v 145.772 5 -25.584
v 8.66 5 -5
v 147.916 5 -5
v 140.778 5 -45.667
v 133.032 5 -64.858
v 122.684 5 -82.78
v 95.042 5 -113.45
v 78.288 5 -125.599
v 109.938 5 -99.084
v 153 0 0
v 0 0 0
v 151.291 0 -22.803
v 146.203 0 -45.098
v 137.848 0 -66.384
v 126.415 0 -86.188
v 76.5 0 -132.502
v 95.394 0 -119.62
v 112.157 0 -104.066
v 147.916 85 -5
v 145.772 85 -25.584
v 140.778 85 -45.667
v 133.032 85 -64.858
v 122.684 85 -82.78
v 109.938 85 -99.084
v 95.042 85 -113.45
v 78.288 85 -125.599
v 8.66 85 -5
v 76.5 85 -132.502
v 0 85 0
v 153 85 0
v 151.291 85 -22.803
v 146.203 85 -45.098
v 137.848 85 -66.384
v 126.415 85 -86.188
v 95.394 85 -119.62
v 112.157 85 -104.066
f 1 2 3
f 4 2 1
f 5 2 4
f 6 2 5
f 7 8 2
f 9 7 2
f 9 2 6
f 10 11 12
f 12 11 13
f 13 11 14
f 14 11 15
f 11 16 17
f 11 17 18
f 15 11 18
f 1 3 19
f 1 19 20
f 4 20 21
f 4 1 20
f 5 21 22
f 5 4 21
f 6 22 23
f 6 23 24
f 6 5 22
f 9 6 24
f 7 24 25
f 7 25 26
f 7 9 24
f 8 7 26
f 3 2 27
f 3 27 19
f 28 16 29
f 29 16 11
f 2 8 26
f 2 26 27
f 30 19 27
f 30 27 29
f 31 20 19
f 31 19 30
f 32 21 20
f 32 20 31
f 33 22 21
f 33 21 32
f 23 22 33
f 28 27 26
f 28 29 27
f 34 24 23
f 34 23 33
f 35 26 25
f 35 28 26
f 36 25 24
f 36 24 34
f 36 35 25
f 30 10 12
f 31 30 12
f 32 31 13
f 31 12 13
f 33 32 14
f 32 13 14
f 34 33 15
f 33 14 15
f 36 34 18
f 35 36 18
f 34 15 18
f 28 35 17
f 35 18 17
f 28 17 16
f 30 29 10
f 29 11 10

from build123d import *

# Parameters (mm, degrees)
EXTRUDE_1_DEPTH   = 5
EXTRUDE_1_2_DEPTH = 80


with BuildPart() as part:
    # 草图1 → Extrude 1 (new body)
    with BuildSketch(Plane(origin=(0, 0, 0), x_dir=(1, 0, 0), z_dir=(0, 1, 0))):
        with BuildLine():
            Line((0, 0), (153, 0))
            ThreePointArc((153, 0), (132.501886779, 76.5), (76.5, 132.501886779))
            Line((76.5, 132.501886779), (0, 0))
        make_face()
    extrude(amount=EXTRUDE_1_DEPTH)

    # 草图2 → Extrude 1 2 (add)
    with BuildSketch(Plane(origin=(0, 5, 0), x_dir=(1, 0, 0), z_dir=(0, 1, 0))):
        with BuildLine():
            Line((76.5, 132.501886779), (0, 0))
            Line((0, 0), (153, 0))
            ThreePointArc((153, 0), (132.501886779, 76.5), (76.5, 132.501886779))
        make_face()
        with BuildLine():
            Line((78.287885233, 125.59859484), (8.660254038, 5))
            Line((8.660254038, 5), (147.915516427, 5))
            ThreePointArc((147.915516427, 5), (128.17175976, 74), (78.287885233, 125.59859484))
        make_face(mode=Mode.SUBTRACT)
    extrude(amount=EXTRUDE_1_2_DEPTH)


solid = part.part
